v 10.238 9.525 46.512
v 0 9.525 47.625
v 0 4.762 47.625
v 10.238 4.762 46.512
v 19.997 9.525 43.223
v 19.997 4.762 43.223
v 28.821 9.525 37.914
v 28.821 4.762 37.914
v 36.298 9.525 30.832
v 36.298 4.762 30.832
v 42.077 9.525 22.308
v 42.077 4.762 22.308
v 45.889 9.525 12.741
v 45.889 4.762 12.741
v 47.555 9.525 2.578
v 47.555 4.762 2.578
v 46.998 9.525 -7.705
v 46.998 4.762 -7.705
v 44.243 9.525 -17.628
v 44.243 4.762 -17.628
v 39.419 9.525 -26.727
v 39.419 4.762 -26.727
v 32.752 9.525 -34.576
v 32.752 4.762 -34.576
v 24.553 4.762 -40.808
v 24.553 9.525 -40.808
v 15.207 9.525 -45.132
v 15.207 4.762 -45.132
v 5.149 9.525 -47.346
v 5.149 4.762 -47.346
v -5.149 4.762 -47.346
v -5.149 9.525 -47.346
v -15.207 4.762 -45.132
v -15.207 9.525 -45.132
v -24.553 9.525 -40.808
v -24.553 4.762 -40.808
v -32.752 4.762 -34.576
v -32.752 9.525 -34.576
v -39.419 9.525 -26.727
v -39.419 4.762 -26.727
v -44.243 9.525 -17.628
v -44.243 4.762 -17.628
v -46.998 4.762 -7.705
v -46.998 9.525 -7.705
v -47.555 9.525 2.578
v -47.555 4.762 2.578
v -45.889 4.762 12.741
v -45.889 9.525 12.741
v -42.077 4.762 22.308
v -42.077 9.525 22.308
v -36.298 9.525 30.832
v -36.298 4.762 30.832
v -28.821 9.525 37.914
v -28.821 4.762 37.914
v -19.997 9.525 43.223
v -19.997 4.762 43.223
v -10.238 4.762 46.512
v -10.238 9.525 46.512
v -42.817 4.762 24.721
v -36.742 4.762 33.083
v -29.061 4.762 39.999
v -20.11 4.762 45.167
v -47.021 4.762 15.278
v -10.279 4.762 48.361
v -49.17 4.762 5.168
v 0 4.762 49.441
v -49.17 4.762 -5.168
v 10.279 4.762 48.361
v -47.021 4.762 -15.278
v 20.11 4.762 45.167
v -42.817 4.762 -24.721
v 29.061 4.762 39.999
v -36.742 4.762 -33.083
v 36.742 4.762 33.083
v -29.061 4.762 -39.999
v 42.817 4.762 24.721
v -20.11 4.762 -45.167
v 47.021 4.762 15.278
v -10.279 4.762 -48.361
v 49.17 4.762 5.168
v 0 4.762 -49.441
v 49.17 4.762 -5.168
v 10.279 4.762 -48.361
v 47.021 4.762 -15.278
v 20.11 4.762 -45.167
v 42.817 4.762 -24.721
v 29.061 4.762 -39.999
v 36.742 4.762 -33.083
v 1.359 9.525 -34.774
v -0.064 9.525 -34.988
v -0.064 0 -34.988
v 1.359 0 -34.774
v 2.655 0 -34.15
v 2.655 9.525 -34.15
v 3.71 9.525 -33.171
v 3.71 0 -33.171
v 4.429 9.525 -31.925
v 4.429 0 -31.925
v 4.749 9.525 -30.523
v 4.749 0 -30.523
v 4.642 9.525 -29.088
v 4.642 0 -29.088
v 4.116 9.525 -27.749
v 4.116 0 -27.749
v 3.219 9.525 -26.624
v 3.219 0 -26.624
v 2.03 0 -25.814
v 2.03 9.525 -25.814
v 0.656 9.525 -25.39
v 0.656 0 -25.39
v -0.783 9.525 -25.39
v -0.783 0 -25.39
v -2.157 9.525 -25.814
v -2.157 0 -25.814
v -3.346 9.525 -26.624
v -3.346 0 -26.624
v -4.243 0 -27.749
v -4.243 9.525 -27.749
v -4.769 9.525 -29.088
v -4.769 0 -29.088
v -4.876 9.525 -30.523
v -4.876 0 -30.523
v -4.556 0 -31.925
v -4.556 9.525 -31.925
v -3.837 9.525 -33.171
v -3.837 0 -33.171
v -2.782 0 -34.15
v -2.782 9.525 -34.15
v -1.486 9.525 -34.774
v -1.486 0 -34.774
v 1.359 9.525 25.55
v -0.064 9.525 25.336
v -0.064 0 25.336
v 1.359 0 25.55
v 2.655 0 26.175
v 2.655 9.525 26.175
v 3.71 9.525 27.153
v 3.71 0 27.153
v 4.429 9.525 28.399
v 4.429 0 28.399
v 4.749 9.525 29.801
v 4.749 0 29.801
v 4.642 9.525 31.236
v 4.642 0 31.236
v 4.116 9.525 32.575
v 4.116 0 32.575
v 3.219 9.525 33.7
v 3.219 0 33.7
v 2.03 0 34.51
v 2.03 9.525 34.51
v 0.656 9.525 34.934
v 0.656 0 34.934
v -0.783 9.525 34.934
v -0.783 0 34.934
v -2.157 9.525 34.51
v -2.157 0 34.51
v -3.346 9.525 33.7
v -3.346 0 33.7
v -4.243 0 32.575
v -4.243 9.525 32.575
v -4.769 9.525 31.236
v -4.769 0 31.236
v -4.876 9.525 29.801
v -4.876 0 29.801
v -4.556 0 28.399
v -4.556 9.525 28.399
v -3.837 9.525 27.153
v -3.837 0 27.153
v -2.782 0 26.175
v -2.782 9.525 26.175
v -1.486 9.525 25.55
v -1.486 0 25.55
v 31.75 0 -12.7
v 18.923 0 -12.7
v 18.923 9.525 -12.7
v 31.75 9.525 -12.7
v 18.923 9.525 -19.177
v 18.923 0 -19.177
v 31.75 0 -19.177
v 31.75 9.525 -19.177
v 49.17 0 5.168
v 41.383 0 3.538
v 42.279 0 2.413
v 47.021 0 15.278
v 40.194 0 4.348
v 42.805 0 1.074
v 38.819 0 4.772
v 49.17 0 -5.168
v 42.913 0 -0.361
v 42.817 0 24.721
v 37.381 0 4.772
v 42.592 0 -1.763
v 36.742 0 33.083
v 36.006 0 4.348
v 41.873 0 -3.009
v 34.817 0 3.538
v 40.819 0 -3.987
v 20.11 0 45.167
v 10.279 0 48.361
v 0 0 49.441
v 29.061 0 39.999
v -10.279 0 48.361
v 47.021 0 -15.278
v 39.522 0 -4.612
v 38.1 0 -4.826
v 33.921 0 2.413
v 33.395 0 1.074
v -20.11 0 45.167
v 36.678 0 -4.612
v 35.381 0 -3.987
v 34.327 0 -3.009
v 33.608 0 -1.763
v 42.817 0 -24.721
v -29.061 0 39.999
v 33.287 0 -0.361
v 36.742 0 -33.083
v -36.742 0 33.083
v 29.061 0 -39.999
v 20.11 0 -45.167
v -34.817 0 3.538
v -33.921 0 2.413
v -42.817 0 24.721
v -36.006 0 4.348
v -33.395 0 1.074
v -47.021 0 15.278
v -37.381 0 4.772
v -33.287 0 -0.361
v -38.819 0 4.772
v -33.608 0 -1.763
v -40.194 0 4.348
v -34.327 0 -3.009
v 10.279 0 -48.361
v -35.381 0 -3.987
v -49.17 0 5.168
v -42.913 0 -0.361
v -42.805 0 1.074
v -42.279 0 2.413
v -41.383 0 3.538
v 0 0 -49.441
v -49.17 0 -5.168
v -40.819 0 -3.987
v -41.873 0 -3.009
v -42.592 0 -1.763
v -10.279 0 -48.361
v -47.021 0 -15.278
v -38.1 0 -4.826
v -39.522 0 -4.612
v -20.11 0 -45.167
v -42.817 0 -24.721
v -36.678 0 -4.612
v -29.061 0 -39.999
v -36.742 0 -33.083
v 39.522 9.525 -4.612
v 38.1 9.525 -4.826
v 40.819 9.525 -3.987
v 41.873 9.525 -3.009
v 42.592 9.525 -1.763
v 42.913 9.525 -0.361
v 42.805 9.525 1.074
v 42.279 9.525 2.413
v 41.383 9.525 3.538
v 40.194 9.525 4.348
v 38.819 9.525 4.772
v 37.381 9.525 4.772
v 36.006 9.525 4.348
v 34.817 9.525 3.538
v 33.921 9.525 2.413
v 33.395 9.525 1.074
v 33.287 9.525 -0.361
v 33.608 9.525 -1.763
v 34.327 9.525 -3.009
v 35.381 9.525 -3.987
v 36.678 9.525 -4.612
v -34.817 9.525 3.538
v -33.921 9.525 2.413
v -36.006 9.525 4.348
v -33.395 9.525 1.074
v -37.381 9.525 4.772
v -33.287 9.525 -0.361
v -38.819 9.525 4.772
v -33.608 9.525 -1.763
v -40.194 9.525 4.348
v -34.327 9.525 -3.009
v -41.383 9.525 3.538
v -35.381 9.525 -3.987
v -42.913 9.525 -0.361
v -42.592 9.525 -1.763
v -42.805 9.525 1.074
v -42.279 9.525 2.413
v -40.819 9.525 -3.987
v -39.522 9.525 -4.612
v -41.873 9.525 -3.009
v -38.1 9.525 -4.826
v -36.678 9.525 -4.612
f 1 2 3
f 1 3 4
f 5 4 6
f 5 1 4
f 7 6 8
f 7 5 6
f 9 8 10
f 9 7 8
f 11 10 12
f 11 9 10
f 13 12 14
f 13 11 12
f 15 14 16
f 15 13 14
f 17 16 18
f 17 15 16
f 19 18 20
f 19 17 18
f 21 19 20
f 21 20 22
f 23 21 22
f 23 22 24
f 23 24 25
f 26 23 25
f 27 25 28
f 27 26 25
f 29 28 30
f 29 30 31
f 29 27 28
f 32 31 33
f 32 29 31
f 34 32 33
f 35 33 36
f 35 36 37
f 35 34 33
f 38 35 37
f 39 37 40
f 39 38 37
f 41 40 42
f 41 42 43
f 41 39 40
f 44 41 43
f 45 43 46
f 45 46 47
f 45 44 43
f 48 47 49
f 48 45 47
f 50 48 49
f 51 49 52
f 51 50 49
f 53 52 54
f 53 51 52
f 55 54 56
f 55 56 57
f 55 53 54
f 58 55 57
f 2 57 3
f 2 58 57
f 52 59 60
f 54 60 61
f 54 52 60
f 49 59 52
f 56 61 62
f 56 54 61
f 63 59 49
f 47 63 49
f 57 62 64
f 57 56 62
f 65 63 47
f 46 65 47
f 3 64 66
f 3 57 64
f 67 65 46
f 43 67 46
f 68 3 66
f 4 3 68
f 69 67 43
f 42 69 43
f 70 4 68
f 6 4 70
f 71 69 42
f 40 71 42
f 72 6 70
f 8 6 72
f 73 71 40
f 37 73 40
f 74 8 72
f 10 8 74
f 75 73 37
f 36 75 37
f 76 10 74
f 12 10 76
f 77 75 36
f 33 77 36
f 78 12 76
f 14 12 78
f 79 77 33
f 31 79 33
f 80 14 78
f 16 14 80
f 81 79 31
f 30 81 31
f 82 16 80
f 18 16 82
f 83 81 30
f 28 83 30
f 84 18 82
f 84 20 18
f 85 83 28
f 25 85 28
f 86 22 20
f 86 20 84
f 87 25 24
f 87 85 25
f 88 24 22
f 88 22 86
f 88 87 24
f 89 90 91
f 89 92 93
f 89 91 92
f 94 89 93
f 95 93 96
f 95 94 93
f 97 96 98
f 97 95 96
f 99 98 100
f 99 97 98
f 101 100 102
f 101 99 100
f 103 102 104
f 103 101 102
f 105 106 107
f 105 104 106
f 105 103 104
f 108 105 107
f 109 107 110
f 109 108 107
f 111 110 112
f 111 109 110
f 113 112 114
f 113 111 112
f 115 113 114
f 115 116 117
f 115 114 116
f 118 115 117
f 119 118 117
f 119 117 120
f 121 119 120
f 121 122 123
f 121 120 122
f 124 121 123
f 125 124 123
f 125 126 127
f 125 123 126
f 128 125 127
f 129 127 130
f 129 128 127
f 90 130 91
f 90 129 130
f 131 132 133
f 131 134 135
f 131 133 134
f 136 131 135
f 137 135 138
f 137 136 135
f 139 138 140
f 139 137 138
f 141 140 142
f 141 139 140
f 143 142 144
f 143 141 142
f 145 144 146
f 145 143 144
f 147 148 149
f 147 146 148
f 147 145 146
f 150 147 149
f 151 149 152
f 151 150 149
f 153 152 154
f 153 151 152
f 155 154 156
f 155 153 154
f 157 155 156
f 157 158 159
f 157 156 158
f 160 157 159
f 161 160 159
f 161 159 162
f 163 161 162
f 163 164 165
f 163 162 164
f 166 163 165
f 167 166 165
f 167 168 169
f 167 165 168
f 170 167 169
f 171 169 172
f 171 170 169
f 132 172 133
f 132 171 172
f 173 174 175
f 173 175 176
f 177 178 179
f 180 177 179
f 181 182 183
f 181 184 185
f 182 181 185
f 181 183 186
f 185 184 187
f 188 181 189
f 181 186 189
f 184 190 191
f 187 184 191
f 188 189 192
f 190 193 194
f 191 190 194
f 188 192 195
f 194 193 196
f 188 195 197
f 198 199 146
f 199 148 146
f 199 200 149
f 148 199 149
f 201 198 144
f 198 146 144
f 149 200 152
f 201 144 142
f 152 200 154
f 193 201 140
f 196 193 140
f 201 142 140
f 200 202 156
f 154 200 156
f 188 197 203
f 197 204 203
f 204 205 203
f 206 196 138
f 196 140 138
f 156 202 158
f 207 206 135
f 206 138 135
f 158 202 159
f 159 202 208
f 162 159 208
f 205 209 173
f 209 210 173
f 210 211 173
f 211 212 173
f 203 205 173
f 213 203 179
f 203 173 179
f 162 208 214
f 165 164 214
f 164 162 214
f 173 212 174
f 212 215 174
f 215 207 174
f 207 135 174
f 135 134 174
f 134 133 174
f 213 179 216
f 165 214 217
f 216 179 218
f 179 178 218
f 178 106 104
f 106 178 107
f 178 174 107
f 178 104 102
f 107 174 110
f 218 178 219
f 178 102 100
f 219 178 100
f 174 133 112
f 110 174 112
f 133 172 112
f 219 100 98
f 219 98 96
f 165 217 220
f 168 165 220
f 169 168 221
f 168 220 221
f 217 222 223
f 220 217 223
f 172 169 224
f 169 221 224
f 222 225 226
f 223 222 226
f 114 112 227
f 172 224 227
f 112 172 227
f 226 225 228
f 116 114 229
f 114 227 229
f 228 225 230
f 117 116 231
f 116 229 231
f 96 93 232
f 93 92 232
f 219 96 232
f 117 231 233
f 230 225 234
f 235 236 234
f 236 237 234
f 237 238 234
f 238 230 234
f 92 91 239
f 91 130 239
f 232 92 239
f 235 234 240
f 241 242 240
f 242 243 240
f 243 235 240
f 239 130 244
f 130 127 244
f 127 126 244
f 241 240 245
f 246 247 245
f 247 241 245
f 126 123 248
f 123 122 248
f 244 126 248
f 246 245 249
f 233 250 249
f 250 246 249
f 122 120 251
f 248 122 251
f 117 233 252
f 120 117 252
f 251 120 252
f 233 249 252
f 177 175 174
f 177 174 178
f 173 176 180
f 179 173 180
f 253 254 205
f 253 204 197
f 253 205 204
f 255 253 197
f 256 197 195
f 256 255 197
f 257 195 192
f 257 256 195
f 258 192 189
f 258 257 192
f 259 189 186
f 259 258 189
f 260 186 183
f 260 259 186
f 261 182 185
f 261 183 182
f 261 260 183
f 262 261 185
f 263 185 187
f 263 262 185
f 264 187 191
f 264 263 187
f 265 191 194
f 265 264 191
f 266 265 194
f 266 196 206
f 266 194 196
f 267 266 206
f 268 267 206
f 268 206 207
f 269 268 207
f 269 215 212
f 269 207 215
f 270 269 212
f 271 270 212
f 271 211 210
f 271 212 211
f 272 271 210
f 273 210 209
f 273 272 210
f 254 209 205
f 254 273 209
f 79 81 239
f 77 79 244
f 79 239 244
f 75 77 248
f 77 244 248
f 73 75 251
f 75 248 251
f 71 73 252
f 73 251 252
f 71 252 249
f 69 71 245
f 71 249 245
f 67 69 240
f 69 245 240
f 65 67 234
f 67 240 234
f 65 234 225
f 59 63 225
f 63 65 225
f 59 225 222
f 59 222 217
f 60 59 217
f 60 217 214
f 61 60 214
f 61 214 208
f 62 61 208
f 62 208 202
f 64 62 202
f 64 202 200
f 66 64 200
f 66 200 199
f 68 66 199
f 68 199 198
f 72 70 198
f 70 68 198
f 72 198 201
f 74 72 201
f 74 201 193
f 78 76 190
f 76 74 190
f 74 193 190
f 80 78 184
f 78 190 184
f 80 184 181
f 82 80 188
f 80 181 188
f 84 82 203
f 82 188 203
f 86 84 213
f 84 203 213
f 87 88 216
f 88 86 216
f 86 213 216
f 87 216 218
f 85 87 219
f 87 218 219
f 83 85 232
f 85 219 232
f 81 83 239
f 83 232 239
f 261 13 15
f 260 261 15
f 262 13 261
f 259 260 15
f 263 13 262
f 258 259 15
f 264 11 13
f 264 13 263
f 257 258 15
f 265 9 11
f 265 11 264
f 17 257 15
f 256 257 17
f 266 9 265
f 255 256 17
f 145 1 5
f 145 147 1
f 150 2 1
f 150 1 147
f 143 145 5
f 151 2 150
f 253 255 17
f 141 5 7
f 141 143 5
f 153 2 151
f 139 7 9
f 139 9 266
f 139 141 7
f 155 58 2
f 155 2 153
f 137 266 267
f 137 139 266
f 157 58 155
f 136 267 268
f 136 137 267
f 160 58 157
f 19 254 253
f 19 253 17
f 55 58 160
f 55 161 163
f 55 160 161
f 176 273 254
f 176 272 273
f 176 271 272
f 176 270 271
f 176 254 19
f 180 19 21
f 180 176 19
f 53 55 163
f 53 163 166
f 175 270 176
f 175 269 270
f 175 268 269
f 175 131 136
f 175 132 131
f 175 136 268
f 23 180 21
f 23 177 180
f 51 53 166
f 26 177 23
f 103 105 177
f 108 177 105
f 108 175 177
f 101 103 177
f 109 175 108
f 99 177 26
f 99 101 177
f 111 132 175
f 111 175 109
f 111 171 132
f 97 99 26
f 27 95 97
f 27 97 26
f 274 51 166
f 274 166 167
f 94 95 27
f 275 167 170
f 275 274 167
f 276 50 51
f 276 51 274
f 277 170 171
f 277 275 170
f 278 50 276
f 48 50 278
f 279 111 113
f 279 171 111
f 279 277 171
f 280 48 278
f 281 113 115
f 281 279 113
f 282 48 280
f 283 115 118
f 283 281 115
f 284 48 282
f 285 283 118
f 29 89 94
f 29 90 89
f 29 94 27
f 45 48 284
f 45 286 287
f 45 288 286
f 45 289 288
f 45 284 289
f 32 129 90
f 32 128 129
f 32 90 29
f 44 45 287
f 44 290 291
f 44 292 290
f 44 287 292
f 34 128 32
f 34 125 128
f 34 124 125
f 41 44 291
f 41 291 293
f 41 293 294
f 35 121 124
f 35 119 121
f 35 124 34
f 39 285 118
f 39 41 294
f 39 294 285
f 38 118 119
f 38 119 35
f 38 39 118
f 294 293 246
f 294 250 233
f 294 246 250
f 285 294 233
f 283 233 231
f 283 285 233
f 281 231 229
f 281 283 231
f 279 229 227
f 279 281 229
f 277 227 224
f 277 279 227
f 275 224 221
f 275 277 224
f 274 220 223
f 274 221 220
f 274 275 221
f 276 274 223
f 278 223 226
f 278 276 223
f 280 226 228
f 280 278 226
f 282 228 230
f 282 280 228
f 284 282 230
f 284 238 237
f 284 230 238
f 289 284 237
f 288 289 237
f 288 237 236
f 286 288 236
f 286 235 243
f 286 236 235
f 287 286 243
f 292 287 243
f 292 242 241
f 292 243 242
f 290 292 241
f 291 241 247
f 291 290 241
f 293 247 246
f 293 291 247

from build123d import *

# Parameters (mm, degrees)
SKETCH1_R               = 49.4411
BOSS_EXTRUDE2_DEPTH     = 9.525
SKETCH4_R               = 50.546
SKETCH4_R_2             = 47.625
CUT_EXTRUDE2_DEPTH      = 4.7625
CUT_EXTRUDE4_DEPTH      = 71.566070908
CUT_EXTRUDE4_DEPTH_BACK = 71.566070908
SKETCH5_R               = 4.826
CUT_EXTRUDE5_DEPTH      = 71.566070908
CUT_EXTRUDE5_DEPTH_BACK = 71.566070908
SKETCH6_W               = 12.827
SKETCH6_H               = 6.477


with BuildPart() as part:
    # Sketch1 → Boss-Extrude2 (new body)
    with BuildSketch(Plane(origin=(0, 0, 0), x_dir=(1, 0, 0), z_dir=(0, 1, 0))):
        with Locations(Location((0, 0, 0), (0, 0, 90))):
            Circle(SKETCH1_R)
    extrude(amount=BOSS_EXTRUDE2_DEPTH)

    # Sketch4 → Cut-Extrude2 (cut)
    with BuildSketch(Plane(origin=(0, 9.525, 0), x_dir=(1, 0, 0), z_dir=(0, 1, 0))):
        Circle(SKETCH4_R)
        with Locations(Location((0, 0, 0), (0, 0, 270))):
            Circle(SKETCH4_R_2, mode=Mode.SUBTRACT)
    extrude(amount=-CUT_EXTRUDE2_DEPTH, mode=Mode.SUBTRACT)

    # Sketch5 → Cut-Extrude4 (cut, two sides: drawn at the far end of the back side and taken through both)
    with BuildSketch(Plane.XZ.offset(-CUT_EXTRUDE4_DEPTH_BACK)):
        with Locations(Location((-0.0635, 30.162076648, 0), (0, 0, 270))):
            Circle(SKETCH5_R)
        with Locations(Location((-0.0635, -30.162076648, 0), (0, 0, 270))):
            Circle(SKETCH5_R)
        with Locations(Location((-38.1, 0, 0), (0, 0, 270))):
            Circle(SKETCH5_R)
        with Locations(Location((38.1, 0, 0), (0, 0, 270))):
            Circle(SKETCH5_R)
    extrude(amount=CUT_EXTRUDE4_DEPTH + CUT_EXTRUDE4_DEPTH_BACK, mode=Mode.SUBTRACT)

    # Sketch6 → Cut-Extrude5 (cut, two sides: drawn at the far end of the back side and taken through both)
    with BuildSketch(Plane(origin=(0, 9.525, 0), x_dir=(1, 0, 0), z_dir=(0, 1, 0)).offset(-CUT_EXTRUDE5_DEPTH_BACK)):
        with Locations((25.3365, 15.9385)):
            Rectangle(SKETCH6_W, SKETCH6_H)
    extrude(amount=CUT_EXTRUDE5_DEPTH + CUT_EXTRUDE5_DEPTH_BACK, mode=Mode.SUBTRACT)


solid = part.part
